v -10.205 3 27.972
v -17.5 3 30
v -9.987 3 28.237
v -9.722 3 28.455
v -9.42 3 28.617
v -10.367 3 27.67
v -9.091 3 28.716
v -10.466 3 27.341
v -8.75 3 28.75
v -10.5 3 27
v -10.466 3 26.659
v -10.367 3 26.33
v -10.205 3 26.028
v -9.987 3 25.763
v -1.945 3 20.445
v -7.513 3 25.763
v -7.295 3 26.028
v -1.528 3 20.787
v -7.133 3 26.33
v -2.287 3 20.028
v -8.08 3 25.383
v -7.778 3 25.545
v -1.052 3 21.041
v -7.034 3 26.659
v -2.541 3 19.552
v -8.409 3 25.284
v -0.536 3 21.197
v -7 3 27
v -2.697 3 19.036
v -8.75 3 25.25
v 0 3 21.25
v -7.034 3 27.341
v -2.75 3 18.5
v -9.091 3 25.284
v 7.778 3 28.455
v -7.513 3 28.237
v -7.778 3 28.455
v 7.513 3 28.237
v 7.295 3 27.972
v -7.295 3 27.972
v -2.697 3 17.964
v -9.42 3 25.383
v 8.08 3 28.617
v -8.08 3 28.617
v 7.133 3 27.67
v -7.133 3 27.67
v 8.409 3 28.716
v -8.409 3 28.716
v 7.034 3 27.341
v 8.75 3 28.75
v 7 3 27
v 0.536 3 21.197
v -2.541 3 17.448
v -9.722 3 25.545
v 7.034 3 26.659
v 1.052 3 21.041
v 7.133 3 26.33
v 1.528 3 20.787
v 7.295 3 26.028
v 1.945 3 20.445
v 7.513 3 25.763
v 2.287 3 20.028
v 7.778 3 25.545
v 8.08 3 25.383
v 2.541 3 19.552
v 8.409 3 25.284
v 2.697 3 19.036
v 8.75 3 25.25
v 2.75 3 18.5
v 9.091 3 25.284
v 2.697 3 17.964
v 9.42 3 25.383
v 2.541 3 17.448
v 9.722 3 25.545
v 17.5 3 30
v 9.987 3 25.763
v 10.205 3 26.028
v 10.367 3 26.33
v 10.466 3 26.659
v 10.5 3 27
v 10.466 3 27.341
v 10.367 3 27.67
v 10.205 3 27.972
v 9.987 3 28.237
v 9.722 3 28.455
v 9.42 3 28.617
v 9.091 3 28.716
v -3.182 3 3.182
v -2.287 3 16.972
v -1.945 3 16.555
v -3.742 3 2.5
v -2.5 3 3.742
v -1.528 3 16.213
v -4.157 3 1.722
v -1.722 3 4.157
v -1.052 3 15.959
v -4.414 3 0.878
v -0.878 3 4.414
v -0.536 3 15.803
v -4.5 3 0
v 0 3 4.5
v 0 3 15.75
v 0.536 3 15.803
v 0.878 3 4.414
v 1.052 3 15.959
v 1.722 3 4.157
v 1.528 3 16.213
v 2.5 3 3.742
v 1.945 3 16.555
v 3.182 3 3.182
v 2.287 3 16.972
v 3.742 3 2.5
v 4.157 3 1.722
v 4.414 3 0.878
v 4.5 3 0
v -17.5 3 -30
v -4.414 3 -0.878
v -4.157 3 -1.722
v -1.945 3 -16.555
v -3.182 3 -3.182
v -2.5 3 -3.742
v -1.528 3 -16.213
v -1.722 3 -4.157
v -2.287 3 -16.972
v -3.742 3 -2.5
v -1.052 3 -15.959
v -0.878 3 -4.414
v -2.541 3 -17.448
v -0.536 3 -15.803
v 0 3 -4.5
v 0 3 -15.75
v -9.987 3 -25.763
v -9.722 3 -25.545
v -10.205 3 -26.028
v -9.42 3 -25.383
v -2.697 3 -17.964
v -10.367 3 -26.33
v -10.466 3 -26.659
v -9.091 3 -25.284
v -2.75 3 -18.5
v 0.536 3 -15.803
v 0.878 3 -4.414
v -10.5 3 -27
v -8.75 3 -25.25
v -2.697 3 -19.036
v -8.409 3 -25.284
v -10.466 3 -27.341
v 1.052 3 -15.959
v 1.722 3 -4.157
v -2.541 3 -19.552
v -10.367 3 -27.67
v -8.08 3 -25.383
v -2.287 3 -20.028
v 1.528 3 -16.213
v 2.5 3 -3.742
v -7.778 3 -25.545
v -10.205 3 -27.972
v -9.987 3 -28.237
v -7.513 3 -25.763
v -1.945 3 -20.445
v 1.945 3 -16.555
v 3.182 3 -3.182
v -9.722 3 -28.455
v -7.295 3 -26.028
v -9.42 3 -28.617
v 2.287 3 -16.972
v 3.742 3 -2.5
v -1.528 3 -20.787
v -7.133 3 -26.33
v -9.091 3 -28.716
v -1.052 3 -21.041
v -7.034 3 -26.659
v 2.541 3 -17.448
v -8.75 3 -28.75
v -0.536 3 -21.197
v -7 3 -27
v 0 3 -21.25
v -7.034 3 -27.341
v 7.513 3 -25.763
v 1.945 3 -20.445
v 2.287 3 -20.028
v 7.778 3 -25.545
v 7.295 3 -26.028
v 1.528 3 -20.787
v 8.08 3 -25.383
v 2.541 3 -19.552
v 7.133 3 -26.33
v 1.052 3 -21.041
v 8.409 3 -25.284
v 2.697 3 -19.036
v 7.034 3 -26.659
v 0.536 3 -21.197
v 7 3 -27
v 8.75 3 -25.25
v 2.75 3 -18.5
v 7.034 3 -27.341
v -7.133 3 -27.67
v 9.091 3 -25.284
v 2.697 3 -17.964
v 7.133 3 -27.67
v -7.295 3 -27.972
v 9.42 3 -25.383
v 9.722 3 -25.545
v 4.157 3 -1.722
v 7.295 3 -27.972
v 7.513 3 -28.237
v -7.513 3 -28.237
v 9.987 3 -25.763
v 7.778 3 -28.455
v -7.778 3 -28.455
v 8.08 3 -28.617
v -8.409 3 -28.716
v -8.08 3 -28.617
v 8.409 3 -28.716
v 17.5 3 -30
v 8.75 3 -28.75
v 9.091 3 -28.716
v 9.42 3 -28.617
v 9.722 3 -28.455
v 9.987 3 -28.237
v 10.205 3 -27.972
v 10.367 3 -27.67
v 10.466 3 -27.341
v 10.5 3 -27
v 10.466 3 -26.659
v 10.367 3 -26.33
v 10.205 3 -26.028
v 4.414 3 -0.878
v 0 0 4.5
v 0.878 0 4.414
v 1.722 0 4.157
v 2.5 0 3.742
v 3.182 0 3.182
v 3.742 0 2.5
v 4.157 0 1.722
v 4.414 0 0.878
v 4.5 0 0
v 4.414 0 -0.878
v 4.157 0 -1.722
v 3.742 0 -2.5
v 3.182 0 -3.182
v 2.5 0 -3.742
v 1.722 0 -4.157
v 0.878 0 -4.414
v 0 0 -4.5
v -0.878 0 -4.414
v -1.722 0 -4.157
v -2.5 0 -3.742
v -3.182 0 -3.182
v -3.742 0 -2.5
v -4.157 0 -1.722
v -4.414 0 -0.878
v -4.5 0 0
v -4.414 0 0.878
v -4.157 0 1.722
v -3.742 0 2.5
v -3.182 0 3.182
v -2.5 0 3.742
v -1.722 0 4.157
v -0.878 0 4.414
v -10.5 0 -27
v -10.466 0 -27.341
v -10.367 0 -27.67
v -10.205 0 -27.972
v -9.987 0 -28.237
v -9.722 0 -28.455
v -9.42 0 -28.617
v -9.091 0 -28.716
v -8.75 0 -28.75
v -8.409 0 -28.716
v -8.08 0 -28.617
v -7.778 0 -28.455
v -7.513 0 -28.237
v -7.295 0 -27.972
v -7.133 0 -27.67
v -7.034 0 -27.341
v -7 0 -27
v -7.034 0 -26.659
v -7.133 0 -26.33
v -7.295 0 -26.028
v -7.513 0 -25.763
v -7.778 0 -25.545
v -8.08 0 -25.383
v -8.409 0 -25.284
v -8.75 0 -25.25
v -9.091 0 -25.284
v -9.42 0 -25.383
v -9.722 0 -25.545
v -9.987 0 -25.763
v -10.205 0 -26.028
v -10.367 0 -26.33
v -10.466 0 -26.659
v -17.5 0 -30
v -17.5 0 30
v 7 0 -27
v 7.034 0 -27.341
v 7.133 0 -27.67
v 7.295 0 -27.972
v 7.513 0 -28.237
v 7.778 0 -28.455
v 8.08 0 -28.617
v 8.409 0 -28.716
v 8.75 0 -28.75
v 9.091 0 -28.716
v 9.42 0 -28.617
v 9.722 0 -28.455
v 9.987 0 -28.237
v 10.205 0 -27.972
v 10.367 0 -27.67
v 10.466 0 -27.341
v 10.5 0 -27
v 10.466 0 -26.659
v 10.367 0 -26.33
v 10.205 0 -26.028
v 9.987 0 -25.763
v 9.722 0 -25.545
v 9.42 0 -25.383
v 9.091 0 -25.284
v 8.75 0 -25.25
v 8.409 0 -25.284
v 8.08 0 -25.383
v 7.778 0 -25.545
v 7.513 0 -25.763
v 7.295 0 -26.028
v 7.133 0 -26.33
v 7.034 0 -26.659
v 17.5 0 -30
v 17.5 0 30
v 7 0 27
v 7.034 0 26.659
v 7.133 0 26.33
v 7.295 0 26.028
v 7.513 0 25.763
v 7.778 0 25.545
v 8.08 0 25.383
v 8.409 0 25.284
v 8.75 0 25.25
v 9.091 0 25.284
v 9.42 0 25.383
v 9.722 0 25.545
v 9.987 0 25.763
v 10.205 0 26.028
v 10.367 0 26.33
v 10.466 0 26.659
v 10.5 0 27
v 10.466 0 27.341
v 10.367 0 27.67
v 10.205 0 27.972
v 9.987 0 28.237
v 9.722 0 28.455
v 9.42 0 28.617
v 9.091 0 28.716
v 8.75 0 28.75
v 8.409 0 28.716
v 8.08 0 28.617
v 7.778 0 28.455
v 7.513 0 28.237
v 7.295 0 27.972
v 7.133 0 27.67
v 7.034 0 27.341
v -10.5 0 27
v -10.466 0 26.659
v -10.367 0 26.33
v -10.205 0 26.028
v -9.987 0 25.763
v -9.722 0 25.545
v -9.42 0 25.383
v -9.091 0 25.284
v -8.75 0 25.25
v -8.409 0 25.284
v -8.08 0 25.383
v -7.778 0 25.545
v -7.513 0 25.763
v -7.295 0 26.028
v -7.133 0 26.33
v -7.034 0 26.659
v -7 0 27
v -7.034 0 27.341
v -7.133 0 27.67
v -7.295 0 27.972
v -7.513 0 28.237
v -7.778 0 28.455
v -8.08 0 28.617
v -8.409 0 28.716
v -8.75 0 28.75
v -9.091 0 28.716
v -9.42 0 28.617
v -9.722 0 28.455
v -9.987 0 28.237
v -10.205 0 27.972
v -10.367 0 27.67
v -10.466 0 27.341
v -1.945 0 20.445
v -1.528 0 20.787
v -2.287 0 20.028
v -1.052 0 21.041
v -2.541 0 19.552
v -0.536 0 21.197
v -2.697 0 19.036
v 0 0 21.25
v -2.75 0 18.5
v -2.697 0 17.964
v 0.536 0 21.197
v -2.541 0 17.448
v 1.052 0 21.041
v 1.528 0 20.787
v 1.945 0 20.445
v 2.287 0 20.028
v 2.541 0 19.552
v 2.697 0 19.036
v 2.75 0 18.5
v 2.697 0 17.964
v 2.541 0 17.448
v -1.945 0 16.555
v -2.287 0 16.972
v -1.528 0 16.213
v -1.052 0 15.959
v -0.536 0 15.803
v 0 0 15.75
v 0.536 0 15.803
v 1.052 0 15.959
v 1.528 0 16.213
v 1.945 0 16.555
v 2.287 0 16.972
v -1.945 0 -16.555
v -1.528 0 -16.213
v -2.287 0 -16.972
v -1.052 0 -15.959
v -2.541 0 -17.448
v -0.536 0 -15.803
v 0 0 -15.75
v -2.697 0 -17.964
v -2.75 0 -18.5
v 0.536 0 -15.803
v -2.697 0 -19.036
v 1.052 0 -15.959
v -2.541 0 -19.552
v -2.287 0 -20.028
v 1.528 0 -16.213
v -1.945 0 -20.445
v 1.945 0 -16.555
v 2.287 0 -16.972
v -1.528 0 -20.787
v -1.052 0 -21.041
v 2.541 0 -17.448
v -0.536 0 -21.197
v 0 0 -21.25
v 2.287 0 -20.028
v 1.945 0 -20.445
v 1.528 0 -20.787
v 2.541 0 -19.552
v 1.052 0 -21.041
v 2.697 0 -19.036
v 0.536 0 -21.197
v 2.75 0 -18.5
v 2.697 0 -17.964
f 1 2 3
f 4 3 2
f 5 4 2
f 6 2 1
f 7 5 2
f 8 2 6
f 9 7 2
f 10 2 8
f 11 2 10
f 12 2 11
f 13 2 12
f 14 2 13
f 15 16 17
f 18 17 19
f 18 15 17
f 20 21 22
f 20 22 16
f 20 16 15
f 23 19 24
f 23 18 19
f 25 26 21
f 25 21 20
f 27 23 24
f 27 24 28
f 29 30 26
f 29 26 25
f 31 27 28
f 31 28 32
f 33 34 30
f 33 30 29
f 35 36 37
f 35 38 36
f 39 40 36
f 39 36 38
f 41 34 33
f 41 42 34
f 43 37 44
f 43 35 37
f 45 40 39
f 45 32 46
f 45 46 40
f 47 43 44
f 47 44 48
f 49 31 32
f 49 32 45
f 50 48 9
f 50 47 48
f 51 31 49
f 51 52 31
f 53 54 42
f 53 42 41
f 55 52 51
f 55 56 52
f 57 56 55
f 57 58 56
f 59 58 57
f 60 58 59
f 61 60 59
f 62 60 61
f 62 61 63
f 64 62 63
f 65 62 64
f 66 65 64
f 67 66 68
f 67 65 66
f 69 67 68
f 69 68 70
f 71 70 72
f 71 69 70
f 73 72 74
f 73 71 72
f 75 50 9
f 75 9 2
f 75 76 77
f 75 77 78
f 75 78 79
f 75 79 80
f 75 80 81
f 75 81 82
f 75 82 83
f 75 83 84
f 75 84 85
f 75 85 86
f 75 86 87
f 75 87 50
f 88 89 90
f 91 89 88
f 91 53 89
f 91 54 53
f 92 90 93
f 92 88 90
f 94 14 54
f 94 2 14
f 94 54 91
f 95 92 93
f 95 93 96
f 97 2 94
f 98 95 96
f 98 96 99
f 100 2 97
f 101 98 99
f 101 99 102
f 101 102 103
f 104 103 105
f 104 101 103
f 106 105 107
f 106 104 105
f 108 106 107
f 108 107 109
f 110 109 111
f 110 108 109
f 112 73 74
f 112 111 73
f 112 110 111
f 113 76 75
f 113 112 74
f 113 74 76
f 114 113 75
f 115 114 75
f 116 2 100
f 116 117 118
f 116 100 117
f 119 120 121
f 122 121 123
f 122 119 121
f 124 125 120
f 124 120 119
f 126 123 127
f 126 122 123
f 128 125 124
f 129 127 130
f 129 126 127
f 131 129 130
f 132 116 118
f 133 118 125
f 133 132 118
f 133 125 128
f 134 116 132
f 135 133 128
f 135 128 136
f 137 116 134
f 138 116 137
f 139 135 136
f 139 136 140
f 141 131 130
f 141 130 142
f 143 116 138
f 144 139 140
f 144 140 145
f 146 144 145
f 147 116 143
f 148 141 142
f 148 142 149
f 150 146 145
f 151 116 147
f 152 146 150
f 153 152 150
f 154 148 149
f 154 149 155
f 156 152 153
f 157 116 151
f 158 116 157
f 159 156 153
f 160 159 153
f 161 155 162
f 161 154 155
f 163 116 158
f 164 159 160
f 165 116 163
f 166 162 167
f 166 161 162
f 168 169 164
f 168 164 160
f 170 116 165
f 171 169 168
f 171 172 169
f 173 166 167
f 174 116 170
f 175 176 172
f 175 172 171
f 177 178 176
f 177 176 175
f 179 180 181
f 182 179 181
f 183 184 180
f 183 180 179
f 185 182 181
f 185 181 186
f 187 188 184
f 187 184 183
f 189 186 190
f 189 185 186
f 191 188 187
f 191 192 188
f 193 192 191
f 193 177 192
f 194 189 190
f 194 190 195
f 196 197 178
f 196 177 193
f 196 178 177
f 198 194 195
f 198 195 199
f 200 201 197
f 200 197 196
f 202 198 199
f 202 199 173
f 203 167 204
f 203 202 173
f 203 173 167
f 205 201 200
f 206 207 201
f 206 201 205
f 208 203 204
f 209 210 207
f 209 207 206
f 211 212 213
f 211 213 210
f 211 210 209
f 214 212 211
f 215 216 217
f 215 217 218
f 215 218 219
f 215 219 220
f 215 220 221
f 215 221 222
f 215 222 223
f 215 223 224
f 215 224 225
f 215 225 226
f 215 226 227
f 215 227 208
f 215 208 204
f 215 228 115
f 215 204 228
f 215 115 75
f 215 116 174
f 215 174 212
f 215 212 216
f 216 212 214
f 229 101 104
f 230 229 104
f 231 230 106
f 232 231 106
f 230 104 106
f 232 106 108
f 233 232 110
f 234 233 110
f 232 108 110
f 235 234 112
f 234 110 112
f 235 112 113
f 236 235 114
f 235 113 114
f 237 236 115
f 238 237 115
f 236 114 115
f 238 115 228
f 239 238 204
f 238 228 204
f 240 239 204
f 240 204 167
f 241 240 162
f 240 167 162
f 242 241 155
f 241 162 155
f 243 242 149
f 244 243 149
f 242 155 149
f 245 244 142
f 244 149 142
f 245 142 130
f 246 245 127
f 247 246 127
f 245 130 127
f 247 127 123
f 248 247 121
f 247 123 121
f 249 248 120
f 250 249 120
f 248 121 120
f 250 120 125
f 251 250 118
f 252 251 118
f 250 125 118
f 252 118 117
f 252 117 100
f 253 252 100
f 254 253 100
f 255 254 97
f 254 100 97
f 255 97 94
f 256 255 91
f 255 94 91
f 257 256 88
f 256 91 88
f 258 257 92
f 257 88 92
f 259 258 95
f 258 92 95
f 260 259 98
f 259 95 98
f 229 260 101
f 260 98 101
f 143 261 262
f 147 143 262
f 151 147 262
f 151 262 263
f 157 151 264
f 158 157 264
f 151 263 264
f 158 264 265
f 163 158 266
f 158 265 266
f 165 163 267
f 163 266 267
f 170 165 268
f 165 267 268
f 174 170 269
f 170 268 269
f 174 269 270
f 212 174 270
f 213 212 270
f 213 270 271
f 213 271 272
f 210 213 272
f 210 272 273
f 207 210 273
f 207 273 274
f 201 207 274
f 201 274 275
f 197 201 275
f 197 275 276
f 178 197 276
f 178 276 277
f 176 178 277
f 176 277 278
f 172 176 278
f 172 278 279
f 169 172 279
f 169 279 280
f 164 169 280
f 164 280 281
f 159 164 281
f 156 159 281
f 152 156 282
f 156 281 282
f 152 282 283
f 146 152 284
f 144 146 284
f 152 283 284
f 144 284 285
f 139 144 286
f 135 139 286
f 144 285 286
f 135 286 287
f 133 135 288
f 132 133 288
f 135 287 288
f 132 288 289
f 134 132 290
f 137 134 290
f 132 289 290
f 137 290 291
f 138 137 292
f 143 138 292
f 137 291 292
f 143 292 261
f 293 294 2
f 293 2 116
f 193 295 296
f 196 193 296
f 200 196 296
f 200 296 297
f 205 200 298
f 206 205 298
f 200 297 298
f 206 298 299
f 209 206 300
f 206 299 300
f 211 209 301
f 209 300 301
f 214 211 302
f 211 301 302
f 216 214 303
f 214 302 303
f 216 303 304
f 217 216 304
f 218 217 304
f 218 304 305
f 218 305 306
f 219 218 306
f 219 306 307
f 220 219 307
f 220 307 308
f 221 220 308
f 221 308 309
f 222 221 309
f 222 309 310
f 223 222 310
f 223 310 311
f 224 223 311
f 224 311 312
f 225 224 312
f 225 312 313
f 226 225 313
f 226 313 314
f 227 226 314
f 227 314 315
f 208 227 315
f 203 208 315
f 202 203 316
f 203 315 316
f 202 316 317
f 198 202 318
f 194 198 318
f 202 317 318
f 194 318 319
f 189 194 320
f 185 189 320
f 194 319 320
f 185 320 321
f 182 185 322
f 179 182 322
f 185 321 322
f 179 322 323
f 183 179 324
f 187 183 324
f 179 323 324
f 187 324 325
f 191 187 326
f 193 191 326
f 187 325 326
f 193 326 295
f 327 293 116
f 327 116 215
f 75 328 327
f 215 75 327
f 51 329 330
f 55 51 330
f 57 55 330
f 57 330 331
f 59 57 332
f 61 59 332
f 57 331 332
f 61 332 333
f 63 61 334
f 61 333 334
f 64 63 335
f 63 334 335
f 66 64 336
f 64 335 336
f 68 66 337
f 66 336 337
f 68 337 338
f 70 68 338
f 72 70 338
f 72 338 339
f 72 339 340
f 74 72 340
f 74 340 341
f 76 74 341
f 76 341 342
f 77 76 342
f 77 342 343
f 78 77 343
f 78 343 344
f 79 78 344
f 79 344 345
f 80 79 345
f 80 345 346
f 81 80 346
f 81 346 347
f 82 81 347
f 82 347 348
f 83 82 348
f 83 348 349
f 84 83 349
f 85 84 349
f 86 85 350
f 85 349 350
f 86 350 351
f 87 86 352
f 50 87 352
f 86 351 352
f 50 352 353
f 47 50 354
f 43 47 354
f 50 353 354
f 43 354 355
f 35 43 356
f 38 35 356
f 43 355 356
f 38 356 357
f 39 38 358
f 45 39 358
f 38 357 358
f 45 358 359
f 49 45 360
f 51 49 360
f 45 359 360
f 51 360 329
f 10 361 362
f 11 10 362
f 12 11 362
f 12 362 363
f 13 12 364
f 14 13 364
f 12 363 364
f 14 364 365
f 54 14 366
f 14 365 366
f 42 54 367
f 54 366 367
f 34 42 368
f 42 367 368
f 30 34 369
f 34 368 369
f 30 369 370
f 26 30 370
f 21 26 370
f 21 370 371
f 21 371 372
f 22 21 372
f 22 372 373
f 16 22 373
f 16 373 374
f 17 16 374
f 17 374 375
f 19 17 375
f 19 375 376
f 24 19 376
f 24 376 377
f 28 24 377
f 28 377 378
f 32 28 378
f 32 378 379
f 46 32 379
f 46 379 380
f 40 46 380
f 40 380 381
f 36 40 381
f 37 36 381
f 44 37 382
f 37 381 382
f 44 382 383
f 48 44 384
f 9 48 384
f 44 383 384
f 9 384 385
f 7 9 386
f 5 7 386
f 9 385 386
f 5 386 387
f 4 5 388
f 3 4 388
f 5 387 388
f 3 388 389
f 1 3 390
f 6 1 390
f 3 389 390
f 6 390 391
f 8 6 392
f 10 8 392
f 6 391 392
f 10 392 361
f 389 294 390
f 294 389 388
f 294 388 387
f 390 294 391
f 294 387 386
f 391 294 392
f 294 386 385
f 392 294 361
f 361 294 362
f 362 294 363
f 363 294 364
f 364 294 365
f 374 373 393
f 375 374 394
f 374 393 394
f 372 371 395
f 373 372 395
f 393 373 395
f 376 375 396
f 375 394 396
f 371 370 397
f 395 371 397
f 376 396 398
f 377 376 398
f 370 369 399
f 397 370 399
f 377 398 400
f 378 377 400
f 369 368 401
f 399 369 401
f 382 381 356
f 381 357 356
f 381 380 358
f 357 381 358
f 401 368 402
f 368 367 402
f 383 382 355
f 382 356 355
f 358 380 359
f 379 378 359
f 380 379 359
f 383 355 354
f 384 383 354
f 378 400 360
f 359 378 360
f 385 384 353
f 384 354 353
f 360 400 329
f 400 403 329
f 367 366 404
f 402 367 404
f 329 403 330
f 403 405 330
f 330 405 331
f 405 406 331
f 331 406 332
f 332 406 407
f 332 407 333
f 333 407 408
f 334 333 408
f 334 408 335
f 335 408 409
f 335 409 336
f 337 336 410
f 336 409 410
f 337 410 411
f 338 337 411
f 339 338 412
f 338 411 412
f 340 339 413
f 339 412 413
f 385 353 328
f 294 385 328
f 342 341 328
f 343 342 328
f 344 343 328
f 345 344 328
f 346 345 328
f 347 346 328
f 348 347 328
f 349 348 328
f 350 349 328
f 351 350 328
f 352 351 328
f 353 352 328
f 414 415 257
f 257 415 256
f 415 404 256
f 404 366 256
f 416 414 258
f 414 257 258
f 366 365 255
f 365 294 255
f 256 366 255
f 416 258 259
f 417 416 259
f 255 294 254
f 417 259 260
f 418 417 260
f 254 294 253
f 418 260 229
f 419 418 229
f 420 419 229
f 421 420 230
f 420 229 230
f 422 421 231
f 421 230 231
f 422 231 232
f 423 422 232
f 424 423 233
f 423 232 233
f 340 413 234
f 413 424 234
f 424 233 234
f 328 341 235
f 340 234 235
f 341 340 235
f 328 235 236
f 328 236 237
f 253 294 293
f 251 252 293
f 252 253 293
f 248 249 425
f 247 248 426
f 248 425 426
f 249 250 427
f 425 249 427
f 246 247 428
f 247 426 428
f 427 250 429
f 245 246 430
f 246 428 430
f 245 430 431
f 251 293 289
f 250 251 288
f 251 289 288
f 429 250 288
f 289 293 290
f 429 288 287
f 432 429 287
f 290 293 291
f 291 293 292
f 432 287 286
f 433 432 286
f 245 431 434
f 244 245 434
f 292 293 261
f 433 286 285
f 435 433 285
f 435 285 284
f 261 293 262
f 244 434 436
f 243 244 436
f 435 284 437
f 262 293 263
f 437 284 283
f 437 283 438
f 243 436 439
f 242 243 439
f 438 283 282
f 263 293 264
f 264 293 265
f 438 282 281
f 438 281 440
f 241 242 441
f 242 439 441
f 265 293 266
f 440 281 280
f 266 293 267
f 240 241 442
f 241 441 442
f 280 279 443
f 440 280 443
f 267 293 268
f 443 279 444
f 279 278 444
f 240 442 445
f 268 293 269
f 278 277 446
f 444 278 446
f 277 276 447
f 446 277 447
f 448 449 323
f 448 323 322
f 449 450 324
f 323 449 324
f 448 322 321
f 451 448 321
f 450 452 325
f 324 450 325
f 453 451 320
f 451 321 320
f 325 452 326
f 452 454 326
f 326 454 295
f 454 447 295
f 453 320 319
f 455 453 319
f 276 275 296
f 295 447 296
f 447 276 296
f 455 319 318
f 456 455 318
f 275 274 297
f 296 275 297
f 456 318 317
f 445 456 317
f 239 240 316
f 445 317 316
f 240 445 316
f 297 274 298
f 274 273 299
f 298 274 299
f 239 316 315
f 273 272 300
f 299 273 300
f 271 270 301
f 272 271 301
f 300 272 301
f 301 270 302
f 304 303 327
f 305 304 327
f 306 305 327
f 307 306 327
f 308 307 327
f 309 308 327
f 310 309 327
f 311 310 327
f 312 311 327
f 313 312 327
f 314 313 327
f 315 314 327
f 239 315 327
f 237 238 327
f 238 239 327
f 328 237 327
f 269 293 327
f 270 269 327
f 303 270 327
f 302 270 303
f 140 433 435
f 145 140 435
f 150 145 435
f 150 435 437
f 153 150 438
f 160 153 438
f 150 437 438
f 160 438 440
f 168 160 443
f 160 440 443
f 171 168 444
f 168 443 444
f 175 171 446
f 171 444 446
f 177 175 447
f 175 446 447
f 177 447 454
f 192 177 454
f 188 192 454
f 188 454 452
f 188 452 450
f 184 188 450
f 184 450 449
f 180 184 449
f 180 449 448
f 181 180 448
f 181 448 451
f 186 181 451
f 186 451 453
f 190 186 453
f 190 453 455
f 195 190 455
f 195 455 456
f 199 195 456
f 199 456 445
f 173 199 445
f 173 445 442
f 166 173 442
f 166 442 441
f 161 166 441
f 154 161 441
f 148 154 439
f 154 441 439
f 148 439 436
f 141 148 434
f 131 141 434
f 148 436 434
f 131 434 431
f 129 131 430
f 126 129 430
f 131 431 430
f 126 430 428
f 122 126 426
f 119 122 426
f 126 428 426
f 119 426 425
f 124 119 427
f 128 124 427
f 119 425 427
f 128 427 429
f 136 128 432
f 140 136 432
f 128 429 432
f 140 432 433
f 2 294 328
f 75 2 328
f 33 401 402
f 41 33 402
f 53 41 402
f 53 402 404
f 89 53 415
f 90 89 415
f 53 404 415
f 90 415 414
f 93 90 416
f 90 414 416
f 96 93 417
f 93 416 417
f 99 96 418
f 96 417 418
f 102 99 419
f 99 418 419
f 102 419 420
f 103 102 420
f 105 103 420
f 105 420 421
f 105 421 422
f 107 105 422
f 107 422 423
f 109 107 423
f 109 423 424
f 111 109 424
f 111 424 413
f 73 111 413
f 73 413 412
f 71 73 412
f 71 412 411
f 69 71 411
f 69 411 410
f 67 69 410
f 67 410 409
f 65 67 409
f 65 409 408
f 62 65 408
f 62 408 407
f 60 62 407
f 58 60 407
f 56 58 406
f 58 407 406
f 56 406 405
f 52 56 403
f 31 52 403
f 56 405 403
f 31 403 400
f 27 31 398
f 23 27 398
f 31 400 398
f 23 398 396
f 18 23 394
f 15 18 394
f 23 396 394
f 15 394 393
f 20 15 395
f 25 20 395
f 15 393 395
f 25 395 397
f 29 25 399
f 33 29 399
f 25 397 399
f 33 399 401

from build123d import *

# Parameters (mm, degrees)
SKETCH_1_W          = 35
SKETCH_1_H          = 60
EXTRUDE_1_DEPTH     = 3
HOLE_WIZARD_1_D     = 3.5
HOLE_WIZARD_2_D     = 5.5
SKETCH_8_R          = 4.5
CUT_EXTRUDE_1_DEPTH = 3


with BuildPart() as part:
    # 草图1 → 凸台-拉伸1 (new body)
    with BuildSketch(Plane(origin=(0, 0, 0), x_dir=(1, 0, 0), z_dir=(0, 1, 0))):
        Rectangle(SKETCH_1_W, SKETCH_1_H)
    extrude(amount=EXTRUDE_1_DEPTH)

    # 孔1 (through all)
    with Locations(Plane(origin=(0, 3, 0), x_dir=(1, 0, 0), z_dir=(0, 1, 0))):
        with Locations((-8.75, 27), (8.75, 27), (8.75, -27), (-8.75, -27)):
            Hole(HOLE_WIZARD_1_D / 2)

    # 孔2 (through all)
    with Locations(Plane(origin=(0, 3, 0), x_dir=(1, 0, 0), z_dir=(0, 1, 0))):
        with Locations((0, 18.5), (0, -18.5)):
            Hole(HOLE_WIZARD_2_D / 2)

    # 草图8 → 切除-拉伸1 (cut)
    with BuildSketch(Plane(origin=(0, 3, 0), x_dir=(1, 0, 0), z_dir=(0, 1, 0))):
        with Locations(Location((0, 0, 0), (0, 0, 270))):
            Circle(SKETCH_8_R)
    extrude(amount=-CUT_EXTRUDE_1_DEPTH, mode=Mode.SUBTRACT)


solid = part.part
